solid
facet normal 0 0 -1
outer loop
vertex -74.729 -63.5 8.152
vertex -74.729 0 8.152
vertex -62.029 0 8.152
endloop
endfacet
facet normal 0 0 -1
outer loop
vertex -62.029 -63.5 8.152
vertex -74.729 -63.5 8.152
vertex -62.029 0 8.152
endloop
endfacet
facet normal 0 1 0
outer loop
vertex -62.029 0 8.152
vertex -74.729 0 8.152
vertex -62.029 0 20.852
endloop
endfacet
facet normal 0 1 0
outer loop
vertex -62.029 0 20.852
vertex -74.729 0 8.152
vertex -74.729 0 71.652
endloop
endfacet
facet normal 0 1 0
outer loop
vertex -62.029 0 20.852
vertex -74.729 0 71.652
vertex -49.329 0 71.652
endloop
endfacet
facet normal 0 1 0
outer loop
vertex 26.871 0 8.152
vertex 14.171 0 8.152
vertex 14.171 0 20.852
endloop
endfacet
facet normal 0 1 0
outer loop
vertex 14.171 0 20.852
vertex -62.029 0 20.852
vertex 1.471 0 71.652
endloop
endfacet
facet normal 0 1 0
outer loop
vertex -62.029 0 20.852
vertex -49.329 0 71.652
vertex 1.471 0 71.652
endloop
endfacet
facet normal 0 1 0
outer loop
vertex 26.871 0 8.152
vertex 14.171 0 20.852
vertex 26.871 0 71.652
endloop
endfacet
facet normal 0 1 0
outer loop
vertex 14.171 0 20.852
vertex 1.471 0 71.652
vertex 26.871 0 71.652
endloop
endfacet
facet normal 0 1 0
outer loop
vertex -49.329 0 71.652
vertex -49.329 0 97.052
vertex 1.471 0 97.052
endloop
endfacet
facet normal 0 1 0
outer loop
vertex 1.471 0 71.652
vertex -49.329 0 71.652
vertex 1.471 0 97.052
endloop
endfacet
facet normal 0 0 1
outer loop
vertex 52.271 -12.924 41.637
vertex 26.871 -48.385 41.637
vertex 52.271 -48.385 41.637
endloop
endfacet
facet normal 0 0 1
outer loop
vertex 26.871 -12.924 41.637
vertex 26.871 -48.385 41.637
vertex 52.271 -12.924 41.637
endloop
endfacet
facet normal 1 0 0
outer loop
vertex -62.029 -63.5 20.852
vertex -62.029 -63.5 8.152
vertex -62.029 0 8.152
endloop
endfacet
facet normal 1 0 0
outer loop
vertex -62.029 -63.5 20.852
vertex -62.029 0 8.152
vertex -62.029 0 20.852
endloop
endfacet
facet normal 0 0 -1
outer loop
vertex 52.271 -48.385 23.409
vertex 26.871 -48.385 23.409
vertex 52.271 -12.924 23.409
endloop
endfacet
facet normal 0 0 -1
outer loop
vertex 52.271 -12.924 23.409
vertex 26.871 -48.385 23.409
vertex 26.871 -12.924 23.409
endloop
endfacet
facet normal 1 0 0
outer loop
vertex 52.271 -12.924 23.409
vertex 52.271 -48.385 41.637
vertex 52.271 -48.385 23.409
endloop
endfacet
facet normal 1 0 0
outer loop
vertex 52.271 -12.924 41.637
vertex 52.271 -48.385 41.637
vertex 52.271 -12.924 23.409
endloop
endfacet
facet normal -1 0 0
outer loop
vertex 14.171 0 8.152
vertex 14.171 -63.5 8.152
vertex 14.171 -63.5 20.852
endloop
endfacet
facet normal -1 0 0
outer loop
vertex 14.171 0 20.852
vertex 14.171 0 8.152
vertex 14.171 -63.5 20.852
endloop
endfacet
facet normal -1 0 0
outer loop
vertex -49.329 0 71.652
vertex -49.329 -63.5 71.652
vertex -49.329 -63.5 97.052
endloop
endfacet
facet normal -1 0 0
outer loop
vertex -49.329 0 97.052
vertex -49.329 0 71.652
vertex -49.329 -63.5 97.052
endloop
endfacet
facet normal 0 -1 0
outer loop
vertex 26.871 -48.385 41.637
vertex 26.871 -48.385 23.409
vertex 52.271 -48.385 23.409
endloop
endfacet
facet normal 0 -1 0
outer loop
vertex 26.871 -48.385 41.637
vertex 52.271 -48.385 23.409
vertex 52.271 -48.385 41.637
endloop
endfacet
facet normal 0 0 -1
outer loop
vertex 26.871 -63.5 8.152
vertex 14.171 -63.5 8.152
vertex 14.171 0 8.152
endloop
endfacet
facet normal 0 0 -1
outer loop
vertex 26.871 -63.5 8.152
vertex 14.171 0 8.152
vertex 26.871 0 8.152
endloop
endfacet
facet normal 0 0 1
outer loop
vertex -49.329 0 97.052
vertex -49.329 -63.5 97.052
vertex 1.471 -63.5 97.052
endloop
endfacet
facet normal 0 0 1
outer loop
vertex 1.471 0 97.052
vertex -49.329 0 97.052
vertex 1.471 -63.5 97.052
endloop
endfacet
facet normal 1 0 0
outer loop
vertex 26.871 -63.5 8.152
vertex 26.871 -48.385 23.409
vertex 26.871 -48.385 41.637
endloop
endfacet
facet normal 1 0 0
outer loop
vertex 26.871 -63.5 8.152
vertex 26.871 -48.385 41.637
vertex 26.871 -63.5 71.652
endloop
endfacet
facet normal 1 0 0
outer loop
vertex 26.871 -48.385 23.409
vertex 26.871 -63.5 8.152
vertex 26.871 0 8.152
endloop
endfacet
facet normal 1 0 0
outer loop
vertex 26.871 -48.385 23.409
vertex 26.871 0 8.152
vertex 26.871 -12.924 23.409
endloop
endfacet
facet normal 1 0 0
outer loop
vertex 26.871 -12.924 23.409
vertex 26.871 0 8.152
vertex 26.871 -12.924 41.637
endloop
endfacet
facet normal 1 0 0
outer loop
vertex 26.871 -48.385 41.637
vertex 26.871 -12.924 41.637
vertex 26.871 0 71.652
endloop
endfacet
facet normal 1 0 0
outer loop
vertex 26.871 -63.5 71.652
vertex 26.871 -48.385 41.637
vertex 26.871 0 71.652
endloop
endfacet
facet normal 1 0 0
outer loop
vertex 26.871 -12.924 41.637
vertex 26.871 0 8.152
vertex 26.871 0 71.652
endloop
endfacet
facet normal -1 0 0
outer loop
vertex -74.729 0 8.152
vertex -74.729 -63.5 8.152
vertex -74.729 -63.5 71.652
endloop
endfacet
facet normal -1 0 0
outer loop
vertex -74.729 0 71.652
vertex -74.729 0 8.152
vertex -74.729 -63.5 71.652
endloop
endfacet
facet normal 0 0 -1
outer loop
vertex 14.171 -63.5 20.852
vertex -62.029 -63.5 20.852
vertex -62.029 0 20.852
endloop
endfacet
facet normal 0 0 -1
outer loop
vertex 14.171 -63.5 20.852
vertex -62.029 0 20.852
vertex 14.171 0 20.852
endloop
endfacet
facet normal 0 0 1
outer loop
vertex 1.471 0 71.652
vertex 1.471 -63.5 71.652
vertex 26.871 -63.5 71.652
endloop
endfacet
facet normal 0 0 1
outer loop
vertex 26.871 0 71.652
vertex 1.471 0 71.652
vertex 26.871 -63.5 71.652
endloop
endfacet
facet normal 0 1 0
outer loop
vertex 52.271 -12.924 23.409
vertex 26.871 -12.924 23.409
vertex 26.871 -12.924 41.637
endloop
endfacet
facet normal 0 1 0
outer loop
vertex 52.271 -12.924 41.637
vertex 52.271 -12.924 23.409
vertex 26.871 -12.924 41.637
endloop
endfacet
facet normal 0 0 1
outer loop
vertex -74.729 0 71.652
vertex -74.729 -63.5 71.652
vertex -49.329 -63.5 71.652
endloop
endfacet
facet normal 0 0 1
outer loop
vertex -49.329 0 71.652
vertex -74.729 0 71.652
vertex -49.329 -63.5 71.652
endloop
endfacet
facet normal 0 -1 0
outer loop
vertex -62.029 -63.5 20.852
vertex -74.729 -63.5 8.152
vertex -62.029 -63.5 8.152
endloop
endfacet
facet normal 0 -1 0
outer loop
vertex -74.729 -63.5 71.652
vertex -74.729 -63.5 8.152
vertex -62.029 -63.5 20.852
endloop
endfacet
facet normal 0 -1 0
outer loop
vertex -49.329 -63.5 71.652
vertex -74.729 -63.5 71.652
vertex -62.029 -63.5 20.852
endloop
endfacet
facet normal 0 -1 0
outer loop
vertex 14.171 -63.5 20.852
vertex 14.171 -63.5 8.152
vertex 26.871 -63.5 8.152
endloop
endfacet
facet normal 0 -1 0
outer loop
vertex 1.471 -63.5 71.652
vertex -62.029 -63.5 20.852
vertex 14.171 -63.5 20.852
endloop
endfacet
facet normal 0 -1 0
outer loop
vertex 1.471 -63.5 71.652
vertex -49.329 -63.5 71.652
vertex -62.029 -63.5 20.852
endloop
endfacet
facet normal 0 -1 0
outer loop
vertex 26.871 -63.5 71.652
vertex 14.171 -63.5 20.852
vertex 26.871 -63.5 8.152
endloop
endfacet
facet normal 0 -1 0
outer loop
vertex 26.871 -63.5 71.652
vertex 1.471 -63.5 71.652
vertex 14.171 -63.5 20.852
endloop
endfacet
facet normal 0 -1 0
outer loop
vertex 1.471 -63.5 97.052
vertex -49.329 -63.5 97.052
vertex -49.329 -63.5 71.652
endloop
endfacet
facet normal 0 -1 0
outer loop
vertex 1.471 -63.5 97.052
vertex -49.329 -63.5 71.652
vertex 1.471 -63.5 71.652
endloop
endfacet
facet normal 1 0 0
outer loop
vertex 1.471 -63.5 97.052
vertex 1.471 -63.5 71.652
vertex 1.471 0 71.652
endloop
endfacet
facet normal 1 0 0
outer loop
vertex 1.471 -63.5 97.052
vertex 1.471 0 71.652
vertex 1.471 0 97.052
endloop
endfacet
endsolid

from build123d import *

# Parameters (mm, degrees)
F0_W     = 101.6
F0_H     = 88.9
F1_DEPTH = 63.5
F2_W     = 25.4
F2_H     = 25.4
F3_DEPTH = 63.5
F4_W     = 25.4
F4_H     = 25.4
F5_DEPTH = 63.5
F6_W     = 76.2
F6_H     = 12.7
F7_DEPTH = 63.5
F8_W     = 35.461226
F8_H     = 18.227942
F9_DEPTH = 25.4


with BuildPart() as f1:
    # F0 (on Front) → F1 (new body)
    with BuildSketch(Plane.XZ):
        with Locations((-23.928717, 52.601962)):
            Rectangle(F0_W, F0_H)
    extrude(amount=F1_DEPTH)

    # F2 (on face) → F3 (cut)
    with BuildSketch(Plane.XZ.offset(63.5)):
        with Locations((-62.028717, 84.351962)):
            Rectangle(F2_W, F2_H)
    extrude(amount=-F3_DEPTH, mode=Mode.SUBTRACT)

    # F4 (on face) → F5 (cut)
    with BuildSketch(Plane.XZ.offset(63.5)):
        with Locations((14.171283, 84.351962)):
            Rectangle(F4_W, F4_H)
    extrude(amount=-F5_DEPTH, mode=Mode.SUBTRACT)

    # F6 (on face) → F7 (cut)
    with BuildSketch(Plane.XZ.offset(63.5)):
        with Locations((-23.928717, 14.501962)):
            Rectangle(F6_W, F6_H)
    extrude(amount=-F7_DEPTH, mode=Mode.SUBTRACT)

    # F8 (on face) → F9 (join)
    with BuildSketch(Plane.YZ.offset(26.871283)):
        with Locations((-30.654847, 32.522842)):
            Rectangle(F8_W, F8_H)
    extrude(amount=F9_DEPTH)


solid = f1.part
